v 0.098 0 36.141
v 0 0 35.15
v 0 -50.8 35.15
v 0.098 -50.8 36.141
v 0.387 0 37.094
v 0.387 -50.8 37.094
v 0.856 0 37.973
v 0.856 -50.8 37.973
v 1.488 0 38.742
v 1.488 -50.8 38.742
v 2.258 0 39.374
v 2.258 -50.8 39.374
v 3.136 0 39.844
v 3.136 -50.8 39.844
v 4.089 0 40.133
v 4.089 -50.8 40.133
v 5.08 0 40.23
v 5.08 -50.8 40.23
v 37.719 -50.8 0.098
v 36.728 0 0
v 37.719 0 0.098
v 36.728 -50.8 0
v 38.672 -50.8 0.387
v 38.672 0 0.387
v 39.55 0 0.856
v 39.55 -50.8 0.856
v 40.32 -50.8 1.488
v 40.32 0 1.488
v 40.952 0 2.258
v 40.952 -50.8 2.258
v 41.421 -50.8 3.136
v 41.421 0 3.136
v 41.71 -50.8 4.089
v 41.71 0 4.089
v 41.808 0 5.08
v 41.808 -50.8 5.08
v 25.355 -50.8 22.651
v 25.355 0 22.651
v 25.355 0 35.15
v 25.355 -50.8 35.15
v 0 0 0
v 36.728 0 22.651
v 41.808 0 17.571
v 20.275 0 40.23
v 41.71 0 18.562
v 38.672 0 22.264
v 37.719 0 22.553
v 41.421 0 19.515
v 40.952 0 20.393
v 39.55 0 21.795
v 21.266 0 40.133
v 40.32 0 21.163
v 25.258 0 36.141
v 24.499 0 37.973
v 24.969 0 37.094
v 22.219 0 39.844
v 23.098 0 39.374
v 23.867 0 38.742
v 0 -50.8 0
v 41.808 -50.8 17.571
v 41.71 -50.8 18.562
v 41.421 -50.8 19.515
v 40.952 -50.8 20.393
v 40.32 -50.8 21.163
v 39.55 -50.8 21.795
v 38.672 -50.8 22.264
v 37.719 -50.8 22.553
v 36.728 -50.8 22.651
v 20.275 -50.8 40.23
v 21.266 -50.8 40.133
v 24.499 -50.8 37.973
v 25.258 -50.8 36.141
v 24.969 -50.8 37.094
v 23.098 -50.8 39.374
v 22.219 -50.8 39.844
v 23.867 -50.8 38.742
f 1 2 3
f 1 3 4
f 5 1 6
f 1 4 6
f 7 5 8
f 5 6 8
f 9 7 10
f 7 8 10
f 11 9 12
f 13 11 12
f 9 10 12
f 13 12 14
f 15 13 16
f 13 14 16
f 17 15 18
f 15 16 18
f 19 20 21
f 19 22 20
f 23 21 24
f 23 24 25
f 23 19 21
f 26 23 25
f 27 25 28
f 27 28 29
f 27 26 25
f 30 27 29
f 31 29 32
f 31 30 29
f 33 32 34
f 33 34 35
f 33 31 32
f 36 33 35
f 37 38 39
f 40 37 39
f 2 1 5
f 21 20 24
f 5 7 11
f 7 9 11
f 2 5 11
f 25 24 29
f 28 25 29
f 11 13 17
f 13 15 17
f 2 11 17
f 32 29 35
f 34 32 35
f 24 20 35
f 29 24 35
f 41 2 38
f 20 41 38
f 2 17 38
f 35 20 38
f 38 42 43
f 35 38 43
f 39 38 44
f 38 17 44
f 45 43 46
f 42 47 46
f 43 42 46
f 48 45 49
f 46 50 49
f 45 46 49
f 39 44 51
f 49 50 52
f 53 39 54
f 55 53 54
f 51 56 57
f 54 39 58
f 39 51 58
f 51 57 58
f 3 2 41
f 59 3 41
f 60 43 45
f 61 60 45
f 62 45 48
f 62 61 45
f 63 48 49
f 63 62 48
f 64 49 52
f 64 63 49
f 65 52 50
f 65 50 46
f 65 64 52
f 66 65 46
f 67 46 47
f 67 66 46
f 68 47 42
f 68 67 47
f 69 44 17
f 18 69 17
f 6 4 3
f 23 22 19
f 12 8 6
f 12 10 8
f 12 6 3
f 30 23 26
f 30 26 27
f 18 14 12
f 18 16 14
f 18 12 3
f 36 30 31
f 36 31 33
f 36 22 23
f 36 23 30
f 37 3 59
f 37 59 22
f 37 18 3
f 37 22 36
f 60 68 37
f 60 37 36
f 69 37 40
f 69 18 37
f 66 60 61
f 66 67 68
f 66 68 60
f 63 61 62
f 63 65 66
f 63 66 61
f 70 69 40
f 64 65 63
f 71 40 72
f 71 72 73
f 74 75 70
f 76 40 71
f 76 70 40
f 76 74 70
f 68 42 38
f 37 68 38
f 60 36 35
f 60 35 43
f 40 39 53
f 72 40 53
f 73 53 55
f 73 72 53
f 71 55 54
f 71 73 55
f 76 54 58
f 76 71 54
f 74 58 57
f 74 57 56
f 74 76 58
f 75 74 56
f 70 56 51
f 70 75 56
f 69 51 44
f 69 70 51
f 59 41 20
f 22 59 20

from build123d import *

# Parameters (mm, degrees)
F1_DEPTH = 50.8
F2_R     = 5.08


with BuildPart() as f1:
    # F0 (on Front) → F1 (new body)
    with BuildSketch(Plane.XZ):
        Polygon((0, 40.230382), (0, 0), (41.808043, 0), (41.808043, 22.650717), (25.355281, 22.650717), (25.355281, 40.230382), align=None)
    extrude(amount=F1_DEPTH)

    # F2
    f2_edges = [f1.edges().sort_by_distance(p)[0] for p in [
        (25.355281, -25.4, 40.230382),
        (41.808043, -25.4, 22.650717),
        (41.808043, -25.4, 0),
        (0, -25.4, 40.230382),
    ]]
    fillet(f2_edges, radius=F2_R)


solid = f1.part
